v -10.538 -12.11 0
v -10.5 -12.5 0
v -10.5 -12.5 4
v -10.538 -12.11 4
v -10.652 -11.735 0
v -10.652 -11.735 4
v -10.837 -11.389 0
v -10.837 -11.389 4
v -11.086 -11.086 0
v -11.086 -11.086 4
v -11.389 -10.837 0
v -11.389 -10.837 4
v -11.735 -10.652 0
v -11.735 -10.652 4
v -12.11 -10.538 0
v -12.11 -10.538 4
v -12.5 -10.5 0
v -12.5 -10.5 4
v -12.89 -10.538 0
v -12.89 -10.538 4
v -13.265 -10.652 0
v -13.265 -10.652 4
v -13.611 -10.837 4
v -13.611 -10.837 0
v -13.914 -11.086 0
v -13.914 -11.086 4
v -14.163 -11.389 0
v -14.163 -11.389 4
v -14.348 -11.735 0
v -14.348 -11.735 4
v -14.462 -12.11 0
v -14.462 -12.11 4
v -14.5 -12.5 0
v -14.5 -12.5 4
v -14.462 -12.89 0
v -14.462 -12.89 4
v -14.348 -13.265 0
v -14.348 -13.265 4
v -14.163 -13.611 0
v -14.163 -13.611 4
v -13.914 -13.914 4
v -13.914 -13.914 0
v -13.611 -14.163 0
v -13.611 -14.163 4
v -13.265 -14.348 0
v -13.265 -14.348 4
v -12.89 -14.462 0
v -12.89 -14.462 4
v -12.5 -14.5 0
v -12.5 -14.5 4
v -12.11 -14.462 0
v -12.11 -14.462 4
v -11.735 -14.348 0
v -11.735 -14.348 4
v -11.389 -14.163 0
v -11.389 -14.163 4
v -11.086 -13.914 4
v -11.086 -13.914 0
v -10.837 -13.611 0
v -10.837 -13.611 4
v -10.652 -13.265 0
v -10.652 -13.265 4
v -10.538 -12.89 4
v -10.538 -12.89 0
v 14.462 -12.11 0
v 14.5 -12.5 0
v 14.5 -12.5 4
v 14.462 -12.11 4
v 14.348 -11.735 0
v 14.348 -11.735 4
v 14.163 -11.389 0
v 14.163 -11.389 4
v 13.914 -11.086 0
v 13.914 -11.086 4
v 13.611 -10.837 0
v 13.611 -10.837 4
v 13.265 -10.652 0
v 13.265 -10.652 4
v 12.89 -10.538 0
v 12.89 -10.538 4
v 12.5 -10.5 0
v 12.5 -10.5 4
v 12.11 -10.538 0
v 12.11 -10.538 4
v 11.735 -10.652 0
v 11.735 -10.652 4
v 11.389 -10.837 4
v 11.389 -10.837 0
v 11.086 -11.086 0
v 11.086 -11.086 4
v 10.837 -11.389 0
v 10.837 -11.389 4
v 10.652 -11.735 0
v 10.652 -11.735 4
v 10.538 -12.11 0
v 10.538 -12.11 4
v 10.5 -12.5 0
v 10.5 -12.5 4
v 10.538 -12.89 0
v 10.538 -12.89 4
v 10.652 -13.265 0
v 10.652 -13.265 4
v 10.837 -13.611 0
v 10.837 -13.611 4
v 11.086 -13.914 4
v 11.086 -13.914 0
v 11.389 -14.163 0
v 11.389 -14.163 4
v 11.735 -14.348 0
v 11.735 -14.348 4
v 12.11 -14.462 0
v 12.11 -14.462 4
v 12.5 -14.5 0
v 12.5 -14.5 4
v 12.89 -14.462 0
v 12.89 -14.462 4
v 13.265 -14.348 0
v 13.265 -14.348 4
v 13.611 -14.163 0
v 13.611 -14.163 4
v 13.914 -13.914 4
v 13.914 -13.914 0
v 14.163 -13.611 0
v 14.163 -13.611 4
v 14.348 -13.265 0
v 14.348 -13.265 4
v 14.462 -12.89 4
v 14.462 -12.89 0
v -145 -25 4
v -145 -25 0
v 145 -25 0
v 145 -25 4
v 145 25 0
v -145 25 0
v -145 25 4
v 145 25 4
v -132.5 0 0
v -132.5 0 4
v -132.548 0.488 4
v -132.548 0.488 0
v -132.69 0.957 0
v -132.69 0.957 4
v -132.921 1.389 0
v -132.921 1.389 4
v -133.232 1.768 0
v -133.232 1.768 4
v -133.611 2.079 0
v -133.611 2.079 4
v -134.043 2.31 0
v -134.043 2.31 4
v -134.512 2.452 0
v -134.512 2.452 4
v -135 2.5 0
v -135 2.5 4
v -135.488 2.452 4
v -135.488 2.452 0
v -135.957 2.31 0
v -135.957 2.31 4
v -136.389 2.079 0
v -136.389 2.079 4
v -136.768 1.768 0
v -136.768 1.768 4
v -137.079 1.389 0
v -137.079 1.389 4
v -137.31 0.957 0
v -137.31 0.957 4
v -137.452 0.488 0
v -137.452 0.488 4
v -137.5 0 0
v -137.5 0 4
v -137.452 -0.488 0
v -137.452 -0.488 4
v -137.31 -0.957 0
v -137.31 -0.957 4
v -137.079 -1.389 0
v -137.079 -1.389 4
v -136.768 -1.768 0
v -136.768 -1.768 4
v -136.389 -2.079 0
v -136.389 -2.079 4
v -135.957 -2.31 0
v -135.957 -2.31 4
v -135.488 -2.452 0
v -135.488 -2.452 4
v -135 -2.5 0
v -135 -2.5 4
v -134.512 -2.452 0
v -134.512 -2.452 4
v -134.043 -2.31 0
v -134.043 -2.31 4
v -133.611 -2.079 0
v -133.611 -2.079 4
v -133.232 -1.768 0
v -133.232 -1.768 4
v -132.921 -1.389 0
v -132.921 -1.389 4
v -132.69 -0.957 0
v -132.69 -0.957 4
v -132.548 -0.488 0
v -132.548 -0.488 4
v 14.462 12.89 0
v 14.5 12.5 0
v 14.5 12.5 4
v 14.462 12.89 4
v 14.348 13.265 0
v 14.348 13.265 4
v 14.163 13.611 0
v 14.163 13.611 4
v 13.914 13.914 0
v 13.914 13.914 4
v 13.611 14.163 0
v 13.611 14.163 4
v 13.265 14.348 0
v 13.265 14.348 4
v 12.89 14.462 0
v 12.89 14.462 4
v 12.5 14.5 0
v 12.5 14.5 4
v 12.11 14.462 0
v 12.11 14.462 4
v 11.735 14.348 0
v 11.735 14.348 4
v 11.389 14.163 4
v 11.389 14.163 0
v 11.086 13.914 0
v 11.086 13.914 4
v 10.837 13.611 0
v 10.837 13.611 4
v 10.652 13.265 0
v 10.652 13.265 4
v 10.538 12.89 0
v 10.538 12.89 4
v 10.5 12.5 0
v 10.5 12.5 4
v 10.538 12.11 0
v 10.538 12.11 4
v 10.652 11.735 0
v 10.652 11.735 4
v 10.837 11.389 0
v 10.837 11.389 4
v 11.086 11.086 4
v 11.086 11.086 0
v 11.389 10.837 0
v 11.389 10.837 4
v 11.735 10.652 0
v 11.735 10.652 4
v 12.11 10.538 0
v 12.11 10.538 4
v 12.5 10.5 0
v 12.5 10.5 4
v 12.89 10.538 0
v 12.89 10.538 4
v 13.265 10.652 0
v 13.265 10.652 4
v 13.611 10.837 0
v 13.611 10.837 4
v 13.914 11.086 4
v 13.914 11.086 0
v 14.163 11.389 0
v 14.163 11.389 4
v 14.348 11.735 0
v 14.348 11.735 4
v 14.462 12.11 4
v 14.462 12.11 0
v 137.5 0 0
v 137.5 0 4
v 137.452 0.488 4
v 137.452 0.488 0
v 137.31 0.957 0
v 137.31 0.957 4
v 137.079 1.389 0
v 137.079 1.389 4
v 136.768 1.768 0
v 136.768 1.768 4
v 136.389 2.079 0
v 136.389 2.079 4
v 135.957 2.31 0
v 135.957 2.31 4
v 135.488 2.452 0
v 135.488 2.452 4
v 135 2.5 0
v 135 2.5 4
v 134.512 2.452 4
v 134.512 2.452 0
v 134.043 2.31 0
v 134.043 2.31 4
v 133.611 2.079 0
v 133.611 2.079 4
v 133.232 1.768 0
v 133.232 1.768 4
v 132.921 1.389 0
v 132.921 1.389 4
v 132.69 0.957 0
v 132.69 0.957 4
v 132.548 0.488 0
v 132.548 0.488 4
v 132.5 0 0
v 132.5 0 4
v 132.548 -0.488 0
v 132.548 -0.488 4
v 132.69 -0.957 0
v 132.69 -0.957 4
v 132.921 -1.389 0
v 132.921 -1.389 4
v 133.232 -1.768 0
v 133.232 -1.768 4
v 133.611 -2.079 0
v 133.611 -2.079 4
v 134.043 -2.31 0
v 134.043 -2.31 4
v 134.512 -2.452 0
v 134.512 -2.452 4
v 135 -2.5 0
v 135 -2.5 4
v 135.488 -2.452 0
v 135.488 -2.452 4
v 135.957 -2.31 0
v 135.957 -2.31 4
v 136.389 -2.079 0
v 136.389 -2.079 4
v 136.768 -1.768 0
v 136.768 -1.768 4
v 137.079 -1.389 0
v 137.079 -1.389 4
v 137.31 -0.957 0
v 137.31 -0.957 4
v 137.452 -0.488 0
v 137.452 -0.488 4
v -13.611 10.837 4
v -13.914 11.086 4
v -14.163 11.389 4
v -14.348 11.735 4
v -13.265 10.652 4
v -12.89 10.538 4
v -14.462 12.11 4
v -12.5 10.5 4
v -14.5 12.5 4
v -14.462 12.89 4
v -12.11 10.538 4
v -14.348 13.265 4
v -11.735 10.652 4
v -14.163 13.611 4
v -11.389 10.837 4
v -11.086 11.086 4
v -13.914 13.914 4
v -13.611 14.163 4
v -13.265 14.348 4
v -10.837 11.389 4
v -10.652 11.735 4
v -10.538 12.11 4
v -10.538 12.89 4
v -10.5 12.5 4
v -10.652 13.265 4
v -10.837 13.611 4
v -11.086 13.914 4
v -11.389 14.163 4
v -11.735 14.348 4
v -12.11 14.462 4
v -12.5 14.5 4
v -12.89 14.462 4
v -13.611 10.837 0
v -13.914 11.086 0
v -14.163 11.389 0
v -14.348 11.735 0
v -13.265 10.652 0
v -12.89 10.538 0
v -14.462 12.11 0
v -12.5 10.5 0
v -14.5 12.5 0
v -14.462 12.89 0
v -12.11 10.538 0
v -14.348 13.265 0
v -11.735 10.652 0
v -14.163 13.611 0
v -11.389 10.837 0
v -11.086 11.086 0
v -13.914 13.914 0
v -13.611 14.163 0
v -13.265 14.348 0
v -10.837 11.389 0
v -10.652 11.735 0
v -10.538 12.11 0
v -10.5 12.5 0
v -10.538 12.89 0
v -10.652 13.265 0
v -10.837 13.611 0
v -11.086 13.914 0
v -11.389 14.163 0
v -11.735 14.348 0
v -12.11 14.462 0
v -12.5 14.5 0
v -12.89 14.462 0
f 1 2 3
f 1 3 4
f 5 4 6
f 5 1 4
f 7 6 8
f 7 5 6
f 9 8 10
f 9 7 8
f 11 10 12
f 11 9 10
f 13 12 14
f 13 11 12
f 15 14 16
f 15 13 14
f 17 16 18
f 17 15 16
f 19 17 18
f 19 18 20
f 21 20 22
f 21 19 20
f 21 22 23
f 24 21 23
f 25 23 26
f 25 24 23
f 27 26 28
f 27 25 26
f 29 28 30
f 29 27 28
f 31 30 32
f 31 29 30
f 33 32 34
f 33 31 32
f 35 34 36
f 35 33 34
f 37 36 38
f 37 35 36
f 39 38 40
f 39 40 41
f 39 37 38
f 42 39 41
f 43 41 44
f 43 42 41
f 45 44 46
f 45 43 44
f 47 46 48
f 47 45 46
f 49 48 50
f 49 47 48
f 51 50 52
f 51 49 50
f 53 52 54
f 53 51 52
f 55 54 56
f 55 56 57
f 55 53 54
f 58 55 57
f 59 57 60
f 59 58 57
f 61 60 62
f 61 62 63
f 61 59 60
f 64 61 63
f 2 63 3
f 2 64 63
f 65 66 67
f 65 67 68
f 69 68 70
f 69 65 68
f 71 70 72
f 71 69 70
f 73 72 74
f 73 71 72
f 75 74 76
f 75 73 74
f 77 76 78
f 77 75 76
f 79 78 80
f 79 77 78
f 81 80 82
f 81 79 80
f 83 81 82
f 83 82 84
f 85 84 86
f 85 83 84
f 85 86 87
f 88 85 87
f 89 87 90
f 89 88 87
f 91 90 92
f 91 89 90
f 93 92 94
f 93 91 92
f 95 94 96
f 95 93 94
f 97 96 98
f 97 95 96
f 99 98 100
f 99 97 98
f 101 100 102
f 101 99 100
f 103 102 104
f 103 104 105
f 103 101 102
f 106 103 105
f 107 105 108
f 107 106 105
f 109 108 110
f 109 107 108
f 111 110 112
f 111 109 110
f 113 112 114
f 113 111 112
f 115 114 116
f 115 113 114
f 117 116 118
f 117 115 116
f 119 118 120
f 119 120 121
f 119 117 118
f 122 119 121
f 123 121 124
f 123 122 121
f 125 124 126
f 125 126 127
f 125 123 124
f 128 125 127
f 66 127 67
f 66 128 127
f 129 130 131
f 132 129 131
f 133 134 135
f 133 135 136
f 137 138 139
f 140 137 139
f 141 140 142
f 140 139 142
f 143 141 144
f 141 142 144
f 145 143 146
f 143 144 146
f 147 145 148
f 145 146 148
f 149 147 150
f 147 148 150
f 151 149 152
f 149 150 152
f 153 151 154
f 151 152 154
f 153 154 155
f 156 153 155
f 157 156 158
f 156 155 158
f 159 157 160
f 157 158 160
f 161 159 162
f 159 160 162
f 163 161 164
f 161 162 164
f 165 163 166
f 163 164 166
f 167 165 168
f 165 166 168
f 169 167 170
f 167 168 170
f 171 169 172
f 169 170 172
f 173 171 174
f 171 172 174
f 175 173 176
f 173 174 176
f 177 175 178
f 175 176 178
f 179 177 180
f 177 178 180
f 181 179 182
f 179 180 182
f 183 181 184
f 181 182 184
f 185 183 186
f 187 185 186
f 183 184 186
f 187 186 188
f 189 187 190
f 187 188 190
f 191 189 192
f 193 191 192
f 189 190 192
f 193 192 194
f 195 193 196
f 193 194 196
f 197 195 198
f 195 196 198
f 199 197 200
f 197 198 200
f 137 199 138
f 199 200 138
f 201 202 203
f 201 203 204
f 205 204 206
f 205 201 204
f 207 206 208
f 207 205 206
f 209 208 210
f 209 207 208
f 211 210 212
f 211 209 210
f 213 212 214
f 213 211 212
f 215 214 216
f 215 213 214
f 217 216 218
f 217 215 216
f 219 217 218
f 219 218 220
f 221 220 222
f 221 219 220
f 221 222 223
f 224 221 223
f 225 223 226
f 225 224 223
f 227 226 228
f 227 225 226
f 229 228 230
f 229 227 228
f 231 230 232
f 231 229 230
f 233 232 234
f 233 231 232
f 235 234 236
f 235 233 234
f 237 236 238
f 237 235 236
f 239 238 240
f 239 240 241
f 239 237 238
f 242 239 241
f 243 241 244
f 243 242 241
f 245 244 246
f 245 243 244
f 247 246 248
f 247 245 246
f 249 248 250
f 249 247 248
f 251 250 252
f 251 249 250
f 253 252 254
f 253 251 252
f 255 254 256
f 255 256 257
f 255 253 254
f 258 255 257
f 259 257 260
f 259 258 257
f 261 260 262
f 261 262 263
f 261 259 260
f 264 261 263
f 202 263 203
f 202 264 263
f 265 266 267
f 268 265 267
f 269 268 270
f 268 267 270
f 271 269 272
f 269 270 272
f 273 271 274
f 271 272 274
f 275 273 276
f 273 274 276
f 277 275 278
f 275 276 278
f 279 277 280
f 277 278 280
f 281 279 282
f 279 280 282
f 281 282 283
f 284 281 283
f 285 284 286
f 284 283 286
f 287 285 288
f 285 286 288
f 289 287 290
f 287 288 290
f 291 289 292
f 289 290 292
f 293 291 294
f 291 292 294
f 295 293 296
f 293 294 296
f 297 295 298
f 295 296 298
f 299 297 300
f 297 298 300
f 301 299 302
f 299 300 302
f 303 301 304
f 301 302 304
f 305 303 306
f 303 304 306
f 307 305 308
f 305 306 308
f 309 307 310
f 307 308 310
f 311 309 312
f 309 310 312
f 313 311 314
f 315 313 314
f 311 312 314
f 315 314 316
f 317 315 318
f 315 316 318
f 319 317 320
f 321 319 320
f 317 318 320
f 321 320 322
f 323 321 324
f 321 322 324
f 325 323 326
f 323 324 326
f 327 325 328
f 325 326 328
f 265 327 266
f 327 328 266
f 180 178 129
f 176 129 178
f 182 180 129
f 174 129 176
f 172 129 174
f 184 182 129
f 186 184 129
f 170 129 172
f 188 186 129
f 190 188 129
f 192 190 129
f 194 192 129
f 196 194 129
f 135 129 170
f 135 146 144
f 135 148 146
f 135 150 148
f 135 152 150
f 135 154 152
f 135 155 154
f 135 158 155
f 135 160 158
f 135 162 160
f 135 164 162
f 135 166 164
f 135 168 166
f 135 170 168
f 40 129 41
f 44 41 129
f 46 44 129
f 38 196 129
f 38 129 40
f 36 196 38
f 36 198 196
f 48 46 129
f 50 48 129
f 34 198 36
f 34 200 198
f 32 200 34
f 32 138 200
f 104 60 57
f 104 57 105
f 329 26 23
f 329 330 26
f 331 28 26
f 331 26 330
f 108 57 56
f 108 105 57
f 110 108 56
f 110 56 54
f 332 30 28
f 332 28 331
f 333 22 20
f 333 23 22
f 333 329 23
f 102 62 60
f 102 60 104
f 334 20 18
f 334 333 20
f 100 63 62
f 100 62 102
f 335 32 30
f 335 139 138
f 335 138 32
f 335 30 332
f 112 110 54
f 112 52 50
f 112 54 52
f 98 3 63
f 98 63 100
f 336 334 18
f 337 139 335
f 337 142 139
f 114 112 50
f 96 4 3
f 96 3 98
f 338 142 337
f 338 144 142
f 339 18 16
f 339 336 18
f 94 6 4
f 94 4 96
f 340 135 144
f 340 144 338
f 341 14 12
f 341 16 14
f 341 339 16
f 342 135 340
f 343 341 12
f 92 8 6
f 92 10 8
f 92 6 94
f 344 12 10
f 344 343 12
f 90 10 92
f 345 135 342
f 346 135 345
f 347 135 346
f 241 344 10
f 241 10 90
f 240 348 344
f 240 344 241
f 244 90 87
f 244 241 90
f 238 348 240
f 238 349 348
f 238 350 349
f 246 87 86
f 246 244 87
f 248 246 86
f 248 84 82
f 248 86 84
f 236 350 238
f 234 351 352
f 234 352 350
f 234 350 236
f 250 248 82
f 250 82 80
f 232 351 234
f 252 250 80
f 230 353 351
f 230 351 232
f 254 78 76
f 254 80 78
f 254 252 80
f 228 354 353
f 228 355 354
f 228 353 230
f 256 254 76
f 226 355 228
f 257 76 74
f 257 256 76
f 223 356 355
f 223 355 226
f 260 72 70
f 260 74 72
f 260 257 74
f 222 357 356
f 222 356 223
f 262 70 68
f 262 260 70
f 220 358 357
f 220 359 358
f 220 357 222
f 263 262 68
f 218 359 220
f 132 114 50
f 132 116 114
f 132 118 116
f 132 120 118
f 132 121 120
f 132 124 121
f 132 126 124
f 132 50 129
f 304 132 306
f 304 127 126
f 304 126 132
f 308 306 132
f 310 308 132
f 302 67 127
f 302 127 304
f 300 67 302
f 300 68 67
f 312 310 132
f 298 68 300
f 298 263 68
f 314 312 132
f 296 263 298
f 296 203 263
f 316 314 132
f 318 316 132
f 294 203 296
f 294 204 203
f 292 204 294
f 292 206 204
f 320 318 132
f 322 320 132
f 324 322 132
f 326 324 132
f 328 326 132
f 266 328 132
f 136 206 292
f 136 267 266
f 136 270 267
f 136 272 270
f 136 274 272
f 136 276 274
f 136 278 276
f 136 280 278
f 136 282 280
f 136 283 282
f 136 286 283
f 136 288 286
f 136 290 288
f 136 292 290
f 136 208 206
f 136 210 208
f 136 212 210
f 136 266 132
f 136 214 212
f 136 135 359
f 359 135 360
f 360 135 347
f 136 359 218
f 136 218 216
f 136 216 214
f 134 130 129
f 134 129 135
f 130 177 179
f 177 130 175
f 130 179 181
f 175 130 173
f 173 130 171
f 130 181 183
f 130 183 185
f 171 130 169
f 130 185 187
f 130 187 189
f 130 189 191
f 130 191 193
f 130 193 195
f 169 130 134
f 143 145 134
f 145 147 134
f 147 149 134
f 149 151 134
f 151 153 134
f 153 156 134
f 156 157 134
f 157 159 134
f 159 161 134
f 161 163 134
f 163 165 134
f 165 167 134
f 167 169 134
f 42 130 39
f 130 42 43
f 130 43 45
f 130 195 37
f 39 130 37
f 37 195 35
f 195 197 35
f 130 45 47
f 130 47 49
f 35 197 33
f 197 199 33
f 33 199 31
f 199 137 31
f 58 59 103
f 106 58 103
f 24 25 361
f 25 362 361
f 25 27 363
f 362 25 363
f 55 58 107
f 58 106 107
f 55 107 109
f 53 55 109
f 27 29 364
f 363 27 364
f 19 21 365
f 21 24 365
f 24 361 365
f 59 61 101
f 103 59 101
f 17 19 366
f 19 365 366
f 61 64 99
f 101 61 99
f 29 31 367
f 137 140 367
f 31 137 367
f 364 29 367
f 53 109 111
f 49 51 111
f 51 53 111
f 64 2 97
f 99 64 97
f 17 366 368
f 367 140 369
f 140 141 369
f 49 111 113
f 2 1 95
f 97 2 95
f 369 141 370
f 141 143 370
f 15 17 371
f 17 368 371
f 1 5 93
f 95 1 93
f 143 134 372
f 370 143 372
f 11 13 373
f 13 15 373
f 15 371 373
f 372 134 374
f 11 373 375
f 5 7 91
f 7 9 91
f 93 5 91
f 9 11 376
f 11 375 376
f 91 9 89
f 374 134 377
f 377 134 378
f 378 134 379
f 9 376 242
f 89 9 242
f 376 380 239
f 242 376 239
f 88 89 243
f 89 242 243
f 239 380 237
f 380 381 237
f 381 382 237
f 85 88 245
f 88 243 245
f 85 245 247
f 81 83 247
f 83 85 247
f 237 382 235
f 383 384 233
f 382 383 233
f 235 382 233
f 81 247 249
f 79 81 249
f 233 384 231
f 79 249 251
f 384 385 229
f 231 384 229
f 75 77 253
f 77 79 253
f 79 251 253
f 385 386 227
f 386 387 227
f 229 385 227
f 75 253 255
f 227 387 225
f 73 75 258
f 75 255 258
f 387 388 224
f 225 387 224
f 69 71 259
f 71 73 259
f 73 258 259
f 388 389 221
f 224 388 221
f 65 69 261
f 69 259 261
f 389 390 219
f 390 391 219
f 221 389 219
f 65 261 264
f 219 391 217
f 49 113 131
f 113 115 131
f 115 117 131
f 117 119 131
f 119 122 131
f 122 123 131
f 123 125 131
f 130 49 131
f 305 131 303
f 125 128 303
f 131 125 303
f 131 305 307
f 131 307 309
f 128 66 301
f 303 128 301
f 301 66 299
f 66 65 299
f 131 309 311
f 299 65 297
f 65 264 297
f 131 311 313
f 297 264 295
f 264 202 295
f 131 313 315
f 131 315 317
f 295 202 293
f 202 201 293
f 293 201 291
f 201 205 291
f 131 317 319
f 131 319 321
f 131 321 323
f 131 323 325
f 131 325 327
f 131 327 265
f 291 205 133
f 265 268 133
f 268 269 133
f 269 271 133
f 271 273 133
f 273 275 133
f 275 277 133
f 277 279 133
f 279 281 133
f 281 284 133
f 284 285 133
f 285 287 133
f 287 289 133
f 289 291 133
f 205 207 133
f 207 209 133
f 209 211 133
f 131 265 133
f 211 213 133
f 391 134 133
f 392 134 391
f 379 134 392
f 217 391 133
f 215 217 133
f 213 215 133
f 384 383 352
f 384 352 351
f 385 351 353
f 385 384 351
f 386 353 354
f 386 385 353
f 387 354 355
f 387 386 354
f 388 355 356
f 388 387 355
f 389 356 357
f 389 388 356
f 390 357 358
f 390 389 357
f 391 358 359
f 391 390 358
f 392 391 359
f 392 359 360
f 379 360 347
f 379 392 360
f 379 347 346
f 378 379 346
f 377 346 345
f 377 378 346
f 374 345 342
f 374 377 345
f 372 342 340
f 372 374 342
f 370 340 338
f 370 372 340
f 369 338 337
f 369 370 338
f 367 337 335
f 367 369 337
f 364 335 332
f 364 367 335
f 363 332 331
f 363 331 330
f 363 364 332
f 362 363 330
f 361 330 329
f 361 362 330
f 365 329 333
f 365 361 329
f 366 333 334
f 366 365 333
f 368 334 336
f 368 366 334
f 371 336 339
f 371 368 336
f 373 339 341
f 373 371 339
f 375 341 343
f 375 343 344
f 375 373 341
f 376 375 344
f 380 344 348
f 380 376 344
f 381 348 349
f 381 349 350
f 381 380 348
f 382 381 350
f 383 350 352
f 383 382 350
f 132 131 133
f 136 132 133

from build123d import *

# Parameters (mm, degrees)
SKETCH1_W           = 290
SKETCH1_H           = 50
SKETCH1_R           = 2
BOSS_EXTRUDE1_DEPTH = 4
SKETCH2_R           = 2.5
CUT_EXTRUDE1_DEPTH  = 4


with BuildPart() as part:
    # Sketch1 → Boss-Extrude1 (new body)
    with BuildSketch(Plane.XY):
        Rectangle(SKETCH1_W, SKETCH1_H)
        with Locations((-12.5, 12.5)):
            Circle(SKETCH1_R, mode=Mode.SUBTRACT)
        with Locations((12.5, 12.5)):
            Circle(SKETCH1_R, mode=Mode.SUBTRACT)
        with Locations((12.5, -12.5)):
            Circle(SKETCH1_R, mode=Mode.SUBTRACT)
        with Locations((-12.5, -12.5)):
            Circle(SKETCH1_R, mode=Mode.SUBTRACT)
    extrude(amount=BOSS_EXTRUDE1_DEPTH)

    # Sketch2 → Cut-Extrude1 (cut)
    with BuildSketch(Plane.XY.offset(4)):
        with Locations((-135, 0)):
            Circle(SKETCH2_R)
        with Locations((135, 0)):
            Circle(SKETCH2_R)
    extrude(amount=-CUT_EXTRUDE1_DEPTH, mode=Mode.SUBTRACT)


solid = part.part
